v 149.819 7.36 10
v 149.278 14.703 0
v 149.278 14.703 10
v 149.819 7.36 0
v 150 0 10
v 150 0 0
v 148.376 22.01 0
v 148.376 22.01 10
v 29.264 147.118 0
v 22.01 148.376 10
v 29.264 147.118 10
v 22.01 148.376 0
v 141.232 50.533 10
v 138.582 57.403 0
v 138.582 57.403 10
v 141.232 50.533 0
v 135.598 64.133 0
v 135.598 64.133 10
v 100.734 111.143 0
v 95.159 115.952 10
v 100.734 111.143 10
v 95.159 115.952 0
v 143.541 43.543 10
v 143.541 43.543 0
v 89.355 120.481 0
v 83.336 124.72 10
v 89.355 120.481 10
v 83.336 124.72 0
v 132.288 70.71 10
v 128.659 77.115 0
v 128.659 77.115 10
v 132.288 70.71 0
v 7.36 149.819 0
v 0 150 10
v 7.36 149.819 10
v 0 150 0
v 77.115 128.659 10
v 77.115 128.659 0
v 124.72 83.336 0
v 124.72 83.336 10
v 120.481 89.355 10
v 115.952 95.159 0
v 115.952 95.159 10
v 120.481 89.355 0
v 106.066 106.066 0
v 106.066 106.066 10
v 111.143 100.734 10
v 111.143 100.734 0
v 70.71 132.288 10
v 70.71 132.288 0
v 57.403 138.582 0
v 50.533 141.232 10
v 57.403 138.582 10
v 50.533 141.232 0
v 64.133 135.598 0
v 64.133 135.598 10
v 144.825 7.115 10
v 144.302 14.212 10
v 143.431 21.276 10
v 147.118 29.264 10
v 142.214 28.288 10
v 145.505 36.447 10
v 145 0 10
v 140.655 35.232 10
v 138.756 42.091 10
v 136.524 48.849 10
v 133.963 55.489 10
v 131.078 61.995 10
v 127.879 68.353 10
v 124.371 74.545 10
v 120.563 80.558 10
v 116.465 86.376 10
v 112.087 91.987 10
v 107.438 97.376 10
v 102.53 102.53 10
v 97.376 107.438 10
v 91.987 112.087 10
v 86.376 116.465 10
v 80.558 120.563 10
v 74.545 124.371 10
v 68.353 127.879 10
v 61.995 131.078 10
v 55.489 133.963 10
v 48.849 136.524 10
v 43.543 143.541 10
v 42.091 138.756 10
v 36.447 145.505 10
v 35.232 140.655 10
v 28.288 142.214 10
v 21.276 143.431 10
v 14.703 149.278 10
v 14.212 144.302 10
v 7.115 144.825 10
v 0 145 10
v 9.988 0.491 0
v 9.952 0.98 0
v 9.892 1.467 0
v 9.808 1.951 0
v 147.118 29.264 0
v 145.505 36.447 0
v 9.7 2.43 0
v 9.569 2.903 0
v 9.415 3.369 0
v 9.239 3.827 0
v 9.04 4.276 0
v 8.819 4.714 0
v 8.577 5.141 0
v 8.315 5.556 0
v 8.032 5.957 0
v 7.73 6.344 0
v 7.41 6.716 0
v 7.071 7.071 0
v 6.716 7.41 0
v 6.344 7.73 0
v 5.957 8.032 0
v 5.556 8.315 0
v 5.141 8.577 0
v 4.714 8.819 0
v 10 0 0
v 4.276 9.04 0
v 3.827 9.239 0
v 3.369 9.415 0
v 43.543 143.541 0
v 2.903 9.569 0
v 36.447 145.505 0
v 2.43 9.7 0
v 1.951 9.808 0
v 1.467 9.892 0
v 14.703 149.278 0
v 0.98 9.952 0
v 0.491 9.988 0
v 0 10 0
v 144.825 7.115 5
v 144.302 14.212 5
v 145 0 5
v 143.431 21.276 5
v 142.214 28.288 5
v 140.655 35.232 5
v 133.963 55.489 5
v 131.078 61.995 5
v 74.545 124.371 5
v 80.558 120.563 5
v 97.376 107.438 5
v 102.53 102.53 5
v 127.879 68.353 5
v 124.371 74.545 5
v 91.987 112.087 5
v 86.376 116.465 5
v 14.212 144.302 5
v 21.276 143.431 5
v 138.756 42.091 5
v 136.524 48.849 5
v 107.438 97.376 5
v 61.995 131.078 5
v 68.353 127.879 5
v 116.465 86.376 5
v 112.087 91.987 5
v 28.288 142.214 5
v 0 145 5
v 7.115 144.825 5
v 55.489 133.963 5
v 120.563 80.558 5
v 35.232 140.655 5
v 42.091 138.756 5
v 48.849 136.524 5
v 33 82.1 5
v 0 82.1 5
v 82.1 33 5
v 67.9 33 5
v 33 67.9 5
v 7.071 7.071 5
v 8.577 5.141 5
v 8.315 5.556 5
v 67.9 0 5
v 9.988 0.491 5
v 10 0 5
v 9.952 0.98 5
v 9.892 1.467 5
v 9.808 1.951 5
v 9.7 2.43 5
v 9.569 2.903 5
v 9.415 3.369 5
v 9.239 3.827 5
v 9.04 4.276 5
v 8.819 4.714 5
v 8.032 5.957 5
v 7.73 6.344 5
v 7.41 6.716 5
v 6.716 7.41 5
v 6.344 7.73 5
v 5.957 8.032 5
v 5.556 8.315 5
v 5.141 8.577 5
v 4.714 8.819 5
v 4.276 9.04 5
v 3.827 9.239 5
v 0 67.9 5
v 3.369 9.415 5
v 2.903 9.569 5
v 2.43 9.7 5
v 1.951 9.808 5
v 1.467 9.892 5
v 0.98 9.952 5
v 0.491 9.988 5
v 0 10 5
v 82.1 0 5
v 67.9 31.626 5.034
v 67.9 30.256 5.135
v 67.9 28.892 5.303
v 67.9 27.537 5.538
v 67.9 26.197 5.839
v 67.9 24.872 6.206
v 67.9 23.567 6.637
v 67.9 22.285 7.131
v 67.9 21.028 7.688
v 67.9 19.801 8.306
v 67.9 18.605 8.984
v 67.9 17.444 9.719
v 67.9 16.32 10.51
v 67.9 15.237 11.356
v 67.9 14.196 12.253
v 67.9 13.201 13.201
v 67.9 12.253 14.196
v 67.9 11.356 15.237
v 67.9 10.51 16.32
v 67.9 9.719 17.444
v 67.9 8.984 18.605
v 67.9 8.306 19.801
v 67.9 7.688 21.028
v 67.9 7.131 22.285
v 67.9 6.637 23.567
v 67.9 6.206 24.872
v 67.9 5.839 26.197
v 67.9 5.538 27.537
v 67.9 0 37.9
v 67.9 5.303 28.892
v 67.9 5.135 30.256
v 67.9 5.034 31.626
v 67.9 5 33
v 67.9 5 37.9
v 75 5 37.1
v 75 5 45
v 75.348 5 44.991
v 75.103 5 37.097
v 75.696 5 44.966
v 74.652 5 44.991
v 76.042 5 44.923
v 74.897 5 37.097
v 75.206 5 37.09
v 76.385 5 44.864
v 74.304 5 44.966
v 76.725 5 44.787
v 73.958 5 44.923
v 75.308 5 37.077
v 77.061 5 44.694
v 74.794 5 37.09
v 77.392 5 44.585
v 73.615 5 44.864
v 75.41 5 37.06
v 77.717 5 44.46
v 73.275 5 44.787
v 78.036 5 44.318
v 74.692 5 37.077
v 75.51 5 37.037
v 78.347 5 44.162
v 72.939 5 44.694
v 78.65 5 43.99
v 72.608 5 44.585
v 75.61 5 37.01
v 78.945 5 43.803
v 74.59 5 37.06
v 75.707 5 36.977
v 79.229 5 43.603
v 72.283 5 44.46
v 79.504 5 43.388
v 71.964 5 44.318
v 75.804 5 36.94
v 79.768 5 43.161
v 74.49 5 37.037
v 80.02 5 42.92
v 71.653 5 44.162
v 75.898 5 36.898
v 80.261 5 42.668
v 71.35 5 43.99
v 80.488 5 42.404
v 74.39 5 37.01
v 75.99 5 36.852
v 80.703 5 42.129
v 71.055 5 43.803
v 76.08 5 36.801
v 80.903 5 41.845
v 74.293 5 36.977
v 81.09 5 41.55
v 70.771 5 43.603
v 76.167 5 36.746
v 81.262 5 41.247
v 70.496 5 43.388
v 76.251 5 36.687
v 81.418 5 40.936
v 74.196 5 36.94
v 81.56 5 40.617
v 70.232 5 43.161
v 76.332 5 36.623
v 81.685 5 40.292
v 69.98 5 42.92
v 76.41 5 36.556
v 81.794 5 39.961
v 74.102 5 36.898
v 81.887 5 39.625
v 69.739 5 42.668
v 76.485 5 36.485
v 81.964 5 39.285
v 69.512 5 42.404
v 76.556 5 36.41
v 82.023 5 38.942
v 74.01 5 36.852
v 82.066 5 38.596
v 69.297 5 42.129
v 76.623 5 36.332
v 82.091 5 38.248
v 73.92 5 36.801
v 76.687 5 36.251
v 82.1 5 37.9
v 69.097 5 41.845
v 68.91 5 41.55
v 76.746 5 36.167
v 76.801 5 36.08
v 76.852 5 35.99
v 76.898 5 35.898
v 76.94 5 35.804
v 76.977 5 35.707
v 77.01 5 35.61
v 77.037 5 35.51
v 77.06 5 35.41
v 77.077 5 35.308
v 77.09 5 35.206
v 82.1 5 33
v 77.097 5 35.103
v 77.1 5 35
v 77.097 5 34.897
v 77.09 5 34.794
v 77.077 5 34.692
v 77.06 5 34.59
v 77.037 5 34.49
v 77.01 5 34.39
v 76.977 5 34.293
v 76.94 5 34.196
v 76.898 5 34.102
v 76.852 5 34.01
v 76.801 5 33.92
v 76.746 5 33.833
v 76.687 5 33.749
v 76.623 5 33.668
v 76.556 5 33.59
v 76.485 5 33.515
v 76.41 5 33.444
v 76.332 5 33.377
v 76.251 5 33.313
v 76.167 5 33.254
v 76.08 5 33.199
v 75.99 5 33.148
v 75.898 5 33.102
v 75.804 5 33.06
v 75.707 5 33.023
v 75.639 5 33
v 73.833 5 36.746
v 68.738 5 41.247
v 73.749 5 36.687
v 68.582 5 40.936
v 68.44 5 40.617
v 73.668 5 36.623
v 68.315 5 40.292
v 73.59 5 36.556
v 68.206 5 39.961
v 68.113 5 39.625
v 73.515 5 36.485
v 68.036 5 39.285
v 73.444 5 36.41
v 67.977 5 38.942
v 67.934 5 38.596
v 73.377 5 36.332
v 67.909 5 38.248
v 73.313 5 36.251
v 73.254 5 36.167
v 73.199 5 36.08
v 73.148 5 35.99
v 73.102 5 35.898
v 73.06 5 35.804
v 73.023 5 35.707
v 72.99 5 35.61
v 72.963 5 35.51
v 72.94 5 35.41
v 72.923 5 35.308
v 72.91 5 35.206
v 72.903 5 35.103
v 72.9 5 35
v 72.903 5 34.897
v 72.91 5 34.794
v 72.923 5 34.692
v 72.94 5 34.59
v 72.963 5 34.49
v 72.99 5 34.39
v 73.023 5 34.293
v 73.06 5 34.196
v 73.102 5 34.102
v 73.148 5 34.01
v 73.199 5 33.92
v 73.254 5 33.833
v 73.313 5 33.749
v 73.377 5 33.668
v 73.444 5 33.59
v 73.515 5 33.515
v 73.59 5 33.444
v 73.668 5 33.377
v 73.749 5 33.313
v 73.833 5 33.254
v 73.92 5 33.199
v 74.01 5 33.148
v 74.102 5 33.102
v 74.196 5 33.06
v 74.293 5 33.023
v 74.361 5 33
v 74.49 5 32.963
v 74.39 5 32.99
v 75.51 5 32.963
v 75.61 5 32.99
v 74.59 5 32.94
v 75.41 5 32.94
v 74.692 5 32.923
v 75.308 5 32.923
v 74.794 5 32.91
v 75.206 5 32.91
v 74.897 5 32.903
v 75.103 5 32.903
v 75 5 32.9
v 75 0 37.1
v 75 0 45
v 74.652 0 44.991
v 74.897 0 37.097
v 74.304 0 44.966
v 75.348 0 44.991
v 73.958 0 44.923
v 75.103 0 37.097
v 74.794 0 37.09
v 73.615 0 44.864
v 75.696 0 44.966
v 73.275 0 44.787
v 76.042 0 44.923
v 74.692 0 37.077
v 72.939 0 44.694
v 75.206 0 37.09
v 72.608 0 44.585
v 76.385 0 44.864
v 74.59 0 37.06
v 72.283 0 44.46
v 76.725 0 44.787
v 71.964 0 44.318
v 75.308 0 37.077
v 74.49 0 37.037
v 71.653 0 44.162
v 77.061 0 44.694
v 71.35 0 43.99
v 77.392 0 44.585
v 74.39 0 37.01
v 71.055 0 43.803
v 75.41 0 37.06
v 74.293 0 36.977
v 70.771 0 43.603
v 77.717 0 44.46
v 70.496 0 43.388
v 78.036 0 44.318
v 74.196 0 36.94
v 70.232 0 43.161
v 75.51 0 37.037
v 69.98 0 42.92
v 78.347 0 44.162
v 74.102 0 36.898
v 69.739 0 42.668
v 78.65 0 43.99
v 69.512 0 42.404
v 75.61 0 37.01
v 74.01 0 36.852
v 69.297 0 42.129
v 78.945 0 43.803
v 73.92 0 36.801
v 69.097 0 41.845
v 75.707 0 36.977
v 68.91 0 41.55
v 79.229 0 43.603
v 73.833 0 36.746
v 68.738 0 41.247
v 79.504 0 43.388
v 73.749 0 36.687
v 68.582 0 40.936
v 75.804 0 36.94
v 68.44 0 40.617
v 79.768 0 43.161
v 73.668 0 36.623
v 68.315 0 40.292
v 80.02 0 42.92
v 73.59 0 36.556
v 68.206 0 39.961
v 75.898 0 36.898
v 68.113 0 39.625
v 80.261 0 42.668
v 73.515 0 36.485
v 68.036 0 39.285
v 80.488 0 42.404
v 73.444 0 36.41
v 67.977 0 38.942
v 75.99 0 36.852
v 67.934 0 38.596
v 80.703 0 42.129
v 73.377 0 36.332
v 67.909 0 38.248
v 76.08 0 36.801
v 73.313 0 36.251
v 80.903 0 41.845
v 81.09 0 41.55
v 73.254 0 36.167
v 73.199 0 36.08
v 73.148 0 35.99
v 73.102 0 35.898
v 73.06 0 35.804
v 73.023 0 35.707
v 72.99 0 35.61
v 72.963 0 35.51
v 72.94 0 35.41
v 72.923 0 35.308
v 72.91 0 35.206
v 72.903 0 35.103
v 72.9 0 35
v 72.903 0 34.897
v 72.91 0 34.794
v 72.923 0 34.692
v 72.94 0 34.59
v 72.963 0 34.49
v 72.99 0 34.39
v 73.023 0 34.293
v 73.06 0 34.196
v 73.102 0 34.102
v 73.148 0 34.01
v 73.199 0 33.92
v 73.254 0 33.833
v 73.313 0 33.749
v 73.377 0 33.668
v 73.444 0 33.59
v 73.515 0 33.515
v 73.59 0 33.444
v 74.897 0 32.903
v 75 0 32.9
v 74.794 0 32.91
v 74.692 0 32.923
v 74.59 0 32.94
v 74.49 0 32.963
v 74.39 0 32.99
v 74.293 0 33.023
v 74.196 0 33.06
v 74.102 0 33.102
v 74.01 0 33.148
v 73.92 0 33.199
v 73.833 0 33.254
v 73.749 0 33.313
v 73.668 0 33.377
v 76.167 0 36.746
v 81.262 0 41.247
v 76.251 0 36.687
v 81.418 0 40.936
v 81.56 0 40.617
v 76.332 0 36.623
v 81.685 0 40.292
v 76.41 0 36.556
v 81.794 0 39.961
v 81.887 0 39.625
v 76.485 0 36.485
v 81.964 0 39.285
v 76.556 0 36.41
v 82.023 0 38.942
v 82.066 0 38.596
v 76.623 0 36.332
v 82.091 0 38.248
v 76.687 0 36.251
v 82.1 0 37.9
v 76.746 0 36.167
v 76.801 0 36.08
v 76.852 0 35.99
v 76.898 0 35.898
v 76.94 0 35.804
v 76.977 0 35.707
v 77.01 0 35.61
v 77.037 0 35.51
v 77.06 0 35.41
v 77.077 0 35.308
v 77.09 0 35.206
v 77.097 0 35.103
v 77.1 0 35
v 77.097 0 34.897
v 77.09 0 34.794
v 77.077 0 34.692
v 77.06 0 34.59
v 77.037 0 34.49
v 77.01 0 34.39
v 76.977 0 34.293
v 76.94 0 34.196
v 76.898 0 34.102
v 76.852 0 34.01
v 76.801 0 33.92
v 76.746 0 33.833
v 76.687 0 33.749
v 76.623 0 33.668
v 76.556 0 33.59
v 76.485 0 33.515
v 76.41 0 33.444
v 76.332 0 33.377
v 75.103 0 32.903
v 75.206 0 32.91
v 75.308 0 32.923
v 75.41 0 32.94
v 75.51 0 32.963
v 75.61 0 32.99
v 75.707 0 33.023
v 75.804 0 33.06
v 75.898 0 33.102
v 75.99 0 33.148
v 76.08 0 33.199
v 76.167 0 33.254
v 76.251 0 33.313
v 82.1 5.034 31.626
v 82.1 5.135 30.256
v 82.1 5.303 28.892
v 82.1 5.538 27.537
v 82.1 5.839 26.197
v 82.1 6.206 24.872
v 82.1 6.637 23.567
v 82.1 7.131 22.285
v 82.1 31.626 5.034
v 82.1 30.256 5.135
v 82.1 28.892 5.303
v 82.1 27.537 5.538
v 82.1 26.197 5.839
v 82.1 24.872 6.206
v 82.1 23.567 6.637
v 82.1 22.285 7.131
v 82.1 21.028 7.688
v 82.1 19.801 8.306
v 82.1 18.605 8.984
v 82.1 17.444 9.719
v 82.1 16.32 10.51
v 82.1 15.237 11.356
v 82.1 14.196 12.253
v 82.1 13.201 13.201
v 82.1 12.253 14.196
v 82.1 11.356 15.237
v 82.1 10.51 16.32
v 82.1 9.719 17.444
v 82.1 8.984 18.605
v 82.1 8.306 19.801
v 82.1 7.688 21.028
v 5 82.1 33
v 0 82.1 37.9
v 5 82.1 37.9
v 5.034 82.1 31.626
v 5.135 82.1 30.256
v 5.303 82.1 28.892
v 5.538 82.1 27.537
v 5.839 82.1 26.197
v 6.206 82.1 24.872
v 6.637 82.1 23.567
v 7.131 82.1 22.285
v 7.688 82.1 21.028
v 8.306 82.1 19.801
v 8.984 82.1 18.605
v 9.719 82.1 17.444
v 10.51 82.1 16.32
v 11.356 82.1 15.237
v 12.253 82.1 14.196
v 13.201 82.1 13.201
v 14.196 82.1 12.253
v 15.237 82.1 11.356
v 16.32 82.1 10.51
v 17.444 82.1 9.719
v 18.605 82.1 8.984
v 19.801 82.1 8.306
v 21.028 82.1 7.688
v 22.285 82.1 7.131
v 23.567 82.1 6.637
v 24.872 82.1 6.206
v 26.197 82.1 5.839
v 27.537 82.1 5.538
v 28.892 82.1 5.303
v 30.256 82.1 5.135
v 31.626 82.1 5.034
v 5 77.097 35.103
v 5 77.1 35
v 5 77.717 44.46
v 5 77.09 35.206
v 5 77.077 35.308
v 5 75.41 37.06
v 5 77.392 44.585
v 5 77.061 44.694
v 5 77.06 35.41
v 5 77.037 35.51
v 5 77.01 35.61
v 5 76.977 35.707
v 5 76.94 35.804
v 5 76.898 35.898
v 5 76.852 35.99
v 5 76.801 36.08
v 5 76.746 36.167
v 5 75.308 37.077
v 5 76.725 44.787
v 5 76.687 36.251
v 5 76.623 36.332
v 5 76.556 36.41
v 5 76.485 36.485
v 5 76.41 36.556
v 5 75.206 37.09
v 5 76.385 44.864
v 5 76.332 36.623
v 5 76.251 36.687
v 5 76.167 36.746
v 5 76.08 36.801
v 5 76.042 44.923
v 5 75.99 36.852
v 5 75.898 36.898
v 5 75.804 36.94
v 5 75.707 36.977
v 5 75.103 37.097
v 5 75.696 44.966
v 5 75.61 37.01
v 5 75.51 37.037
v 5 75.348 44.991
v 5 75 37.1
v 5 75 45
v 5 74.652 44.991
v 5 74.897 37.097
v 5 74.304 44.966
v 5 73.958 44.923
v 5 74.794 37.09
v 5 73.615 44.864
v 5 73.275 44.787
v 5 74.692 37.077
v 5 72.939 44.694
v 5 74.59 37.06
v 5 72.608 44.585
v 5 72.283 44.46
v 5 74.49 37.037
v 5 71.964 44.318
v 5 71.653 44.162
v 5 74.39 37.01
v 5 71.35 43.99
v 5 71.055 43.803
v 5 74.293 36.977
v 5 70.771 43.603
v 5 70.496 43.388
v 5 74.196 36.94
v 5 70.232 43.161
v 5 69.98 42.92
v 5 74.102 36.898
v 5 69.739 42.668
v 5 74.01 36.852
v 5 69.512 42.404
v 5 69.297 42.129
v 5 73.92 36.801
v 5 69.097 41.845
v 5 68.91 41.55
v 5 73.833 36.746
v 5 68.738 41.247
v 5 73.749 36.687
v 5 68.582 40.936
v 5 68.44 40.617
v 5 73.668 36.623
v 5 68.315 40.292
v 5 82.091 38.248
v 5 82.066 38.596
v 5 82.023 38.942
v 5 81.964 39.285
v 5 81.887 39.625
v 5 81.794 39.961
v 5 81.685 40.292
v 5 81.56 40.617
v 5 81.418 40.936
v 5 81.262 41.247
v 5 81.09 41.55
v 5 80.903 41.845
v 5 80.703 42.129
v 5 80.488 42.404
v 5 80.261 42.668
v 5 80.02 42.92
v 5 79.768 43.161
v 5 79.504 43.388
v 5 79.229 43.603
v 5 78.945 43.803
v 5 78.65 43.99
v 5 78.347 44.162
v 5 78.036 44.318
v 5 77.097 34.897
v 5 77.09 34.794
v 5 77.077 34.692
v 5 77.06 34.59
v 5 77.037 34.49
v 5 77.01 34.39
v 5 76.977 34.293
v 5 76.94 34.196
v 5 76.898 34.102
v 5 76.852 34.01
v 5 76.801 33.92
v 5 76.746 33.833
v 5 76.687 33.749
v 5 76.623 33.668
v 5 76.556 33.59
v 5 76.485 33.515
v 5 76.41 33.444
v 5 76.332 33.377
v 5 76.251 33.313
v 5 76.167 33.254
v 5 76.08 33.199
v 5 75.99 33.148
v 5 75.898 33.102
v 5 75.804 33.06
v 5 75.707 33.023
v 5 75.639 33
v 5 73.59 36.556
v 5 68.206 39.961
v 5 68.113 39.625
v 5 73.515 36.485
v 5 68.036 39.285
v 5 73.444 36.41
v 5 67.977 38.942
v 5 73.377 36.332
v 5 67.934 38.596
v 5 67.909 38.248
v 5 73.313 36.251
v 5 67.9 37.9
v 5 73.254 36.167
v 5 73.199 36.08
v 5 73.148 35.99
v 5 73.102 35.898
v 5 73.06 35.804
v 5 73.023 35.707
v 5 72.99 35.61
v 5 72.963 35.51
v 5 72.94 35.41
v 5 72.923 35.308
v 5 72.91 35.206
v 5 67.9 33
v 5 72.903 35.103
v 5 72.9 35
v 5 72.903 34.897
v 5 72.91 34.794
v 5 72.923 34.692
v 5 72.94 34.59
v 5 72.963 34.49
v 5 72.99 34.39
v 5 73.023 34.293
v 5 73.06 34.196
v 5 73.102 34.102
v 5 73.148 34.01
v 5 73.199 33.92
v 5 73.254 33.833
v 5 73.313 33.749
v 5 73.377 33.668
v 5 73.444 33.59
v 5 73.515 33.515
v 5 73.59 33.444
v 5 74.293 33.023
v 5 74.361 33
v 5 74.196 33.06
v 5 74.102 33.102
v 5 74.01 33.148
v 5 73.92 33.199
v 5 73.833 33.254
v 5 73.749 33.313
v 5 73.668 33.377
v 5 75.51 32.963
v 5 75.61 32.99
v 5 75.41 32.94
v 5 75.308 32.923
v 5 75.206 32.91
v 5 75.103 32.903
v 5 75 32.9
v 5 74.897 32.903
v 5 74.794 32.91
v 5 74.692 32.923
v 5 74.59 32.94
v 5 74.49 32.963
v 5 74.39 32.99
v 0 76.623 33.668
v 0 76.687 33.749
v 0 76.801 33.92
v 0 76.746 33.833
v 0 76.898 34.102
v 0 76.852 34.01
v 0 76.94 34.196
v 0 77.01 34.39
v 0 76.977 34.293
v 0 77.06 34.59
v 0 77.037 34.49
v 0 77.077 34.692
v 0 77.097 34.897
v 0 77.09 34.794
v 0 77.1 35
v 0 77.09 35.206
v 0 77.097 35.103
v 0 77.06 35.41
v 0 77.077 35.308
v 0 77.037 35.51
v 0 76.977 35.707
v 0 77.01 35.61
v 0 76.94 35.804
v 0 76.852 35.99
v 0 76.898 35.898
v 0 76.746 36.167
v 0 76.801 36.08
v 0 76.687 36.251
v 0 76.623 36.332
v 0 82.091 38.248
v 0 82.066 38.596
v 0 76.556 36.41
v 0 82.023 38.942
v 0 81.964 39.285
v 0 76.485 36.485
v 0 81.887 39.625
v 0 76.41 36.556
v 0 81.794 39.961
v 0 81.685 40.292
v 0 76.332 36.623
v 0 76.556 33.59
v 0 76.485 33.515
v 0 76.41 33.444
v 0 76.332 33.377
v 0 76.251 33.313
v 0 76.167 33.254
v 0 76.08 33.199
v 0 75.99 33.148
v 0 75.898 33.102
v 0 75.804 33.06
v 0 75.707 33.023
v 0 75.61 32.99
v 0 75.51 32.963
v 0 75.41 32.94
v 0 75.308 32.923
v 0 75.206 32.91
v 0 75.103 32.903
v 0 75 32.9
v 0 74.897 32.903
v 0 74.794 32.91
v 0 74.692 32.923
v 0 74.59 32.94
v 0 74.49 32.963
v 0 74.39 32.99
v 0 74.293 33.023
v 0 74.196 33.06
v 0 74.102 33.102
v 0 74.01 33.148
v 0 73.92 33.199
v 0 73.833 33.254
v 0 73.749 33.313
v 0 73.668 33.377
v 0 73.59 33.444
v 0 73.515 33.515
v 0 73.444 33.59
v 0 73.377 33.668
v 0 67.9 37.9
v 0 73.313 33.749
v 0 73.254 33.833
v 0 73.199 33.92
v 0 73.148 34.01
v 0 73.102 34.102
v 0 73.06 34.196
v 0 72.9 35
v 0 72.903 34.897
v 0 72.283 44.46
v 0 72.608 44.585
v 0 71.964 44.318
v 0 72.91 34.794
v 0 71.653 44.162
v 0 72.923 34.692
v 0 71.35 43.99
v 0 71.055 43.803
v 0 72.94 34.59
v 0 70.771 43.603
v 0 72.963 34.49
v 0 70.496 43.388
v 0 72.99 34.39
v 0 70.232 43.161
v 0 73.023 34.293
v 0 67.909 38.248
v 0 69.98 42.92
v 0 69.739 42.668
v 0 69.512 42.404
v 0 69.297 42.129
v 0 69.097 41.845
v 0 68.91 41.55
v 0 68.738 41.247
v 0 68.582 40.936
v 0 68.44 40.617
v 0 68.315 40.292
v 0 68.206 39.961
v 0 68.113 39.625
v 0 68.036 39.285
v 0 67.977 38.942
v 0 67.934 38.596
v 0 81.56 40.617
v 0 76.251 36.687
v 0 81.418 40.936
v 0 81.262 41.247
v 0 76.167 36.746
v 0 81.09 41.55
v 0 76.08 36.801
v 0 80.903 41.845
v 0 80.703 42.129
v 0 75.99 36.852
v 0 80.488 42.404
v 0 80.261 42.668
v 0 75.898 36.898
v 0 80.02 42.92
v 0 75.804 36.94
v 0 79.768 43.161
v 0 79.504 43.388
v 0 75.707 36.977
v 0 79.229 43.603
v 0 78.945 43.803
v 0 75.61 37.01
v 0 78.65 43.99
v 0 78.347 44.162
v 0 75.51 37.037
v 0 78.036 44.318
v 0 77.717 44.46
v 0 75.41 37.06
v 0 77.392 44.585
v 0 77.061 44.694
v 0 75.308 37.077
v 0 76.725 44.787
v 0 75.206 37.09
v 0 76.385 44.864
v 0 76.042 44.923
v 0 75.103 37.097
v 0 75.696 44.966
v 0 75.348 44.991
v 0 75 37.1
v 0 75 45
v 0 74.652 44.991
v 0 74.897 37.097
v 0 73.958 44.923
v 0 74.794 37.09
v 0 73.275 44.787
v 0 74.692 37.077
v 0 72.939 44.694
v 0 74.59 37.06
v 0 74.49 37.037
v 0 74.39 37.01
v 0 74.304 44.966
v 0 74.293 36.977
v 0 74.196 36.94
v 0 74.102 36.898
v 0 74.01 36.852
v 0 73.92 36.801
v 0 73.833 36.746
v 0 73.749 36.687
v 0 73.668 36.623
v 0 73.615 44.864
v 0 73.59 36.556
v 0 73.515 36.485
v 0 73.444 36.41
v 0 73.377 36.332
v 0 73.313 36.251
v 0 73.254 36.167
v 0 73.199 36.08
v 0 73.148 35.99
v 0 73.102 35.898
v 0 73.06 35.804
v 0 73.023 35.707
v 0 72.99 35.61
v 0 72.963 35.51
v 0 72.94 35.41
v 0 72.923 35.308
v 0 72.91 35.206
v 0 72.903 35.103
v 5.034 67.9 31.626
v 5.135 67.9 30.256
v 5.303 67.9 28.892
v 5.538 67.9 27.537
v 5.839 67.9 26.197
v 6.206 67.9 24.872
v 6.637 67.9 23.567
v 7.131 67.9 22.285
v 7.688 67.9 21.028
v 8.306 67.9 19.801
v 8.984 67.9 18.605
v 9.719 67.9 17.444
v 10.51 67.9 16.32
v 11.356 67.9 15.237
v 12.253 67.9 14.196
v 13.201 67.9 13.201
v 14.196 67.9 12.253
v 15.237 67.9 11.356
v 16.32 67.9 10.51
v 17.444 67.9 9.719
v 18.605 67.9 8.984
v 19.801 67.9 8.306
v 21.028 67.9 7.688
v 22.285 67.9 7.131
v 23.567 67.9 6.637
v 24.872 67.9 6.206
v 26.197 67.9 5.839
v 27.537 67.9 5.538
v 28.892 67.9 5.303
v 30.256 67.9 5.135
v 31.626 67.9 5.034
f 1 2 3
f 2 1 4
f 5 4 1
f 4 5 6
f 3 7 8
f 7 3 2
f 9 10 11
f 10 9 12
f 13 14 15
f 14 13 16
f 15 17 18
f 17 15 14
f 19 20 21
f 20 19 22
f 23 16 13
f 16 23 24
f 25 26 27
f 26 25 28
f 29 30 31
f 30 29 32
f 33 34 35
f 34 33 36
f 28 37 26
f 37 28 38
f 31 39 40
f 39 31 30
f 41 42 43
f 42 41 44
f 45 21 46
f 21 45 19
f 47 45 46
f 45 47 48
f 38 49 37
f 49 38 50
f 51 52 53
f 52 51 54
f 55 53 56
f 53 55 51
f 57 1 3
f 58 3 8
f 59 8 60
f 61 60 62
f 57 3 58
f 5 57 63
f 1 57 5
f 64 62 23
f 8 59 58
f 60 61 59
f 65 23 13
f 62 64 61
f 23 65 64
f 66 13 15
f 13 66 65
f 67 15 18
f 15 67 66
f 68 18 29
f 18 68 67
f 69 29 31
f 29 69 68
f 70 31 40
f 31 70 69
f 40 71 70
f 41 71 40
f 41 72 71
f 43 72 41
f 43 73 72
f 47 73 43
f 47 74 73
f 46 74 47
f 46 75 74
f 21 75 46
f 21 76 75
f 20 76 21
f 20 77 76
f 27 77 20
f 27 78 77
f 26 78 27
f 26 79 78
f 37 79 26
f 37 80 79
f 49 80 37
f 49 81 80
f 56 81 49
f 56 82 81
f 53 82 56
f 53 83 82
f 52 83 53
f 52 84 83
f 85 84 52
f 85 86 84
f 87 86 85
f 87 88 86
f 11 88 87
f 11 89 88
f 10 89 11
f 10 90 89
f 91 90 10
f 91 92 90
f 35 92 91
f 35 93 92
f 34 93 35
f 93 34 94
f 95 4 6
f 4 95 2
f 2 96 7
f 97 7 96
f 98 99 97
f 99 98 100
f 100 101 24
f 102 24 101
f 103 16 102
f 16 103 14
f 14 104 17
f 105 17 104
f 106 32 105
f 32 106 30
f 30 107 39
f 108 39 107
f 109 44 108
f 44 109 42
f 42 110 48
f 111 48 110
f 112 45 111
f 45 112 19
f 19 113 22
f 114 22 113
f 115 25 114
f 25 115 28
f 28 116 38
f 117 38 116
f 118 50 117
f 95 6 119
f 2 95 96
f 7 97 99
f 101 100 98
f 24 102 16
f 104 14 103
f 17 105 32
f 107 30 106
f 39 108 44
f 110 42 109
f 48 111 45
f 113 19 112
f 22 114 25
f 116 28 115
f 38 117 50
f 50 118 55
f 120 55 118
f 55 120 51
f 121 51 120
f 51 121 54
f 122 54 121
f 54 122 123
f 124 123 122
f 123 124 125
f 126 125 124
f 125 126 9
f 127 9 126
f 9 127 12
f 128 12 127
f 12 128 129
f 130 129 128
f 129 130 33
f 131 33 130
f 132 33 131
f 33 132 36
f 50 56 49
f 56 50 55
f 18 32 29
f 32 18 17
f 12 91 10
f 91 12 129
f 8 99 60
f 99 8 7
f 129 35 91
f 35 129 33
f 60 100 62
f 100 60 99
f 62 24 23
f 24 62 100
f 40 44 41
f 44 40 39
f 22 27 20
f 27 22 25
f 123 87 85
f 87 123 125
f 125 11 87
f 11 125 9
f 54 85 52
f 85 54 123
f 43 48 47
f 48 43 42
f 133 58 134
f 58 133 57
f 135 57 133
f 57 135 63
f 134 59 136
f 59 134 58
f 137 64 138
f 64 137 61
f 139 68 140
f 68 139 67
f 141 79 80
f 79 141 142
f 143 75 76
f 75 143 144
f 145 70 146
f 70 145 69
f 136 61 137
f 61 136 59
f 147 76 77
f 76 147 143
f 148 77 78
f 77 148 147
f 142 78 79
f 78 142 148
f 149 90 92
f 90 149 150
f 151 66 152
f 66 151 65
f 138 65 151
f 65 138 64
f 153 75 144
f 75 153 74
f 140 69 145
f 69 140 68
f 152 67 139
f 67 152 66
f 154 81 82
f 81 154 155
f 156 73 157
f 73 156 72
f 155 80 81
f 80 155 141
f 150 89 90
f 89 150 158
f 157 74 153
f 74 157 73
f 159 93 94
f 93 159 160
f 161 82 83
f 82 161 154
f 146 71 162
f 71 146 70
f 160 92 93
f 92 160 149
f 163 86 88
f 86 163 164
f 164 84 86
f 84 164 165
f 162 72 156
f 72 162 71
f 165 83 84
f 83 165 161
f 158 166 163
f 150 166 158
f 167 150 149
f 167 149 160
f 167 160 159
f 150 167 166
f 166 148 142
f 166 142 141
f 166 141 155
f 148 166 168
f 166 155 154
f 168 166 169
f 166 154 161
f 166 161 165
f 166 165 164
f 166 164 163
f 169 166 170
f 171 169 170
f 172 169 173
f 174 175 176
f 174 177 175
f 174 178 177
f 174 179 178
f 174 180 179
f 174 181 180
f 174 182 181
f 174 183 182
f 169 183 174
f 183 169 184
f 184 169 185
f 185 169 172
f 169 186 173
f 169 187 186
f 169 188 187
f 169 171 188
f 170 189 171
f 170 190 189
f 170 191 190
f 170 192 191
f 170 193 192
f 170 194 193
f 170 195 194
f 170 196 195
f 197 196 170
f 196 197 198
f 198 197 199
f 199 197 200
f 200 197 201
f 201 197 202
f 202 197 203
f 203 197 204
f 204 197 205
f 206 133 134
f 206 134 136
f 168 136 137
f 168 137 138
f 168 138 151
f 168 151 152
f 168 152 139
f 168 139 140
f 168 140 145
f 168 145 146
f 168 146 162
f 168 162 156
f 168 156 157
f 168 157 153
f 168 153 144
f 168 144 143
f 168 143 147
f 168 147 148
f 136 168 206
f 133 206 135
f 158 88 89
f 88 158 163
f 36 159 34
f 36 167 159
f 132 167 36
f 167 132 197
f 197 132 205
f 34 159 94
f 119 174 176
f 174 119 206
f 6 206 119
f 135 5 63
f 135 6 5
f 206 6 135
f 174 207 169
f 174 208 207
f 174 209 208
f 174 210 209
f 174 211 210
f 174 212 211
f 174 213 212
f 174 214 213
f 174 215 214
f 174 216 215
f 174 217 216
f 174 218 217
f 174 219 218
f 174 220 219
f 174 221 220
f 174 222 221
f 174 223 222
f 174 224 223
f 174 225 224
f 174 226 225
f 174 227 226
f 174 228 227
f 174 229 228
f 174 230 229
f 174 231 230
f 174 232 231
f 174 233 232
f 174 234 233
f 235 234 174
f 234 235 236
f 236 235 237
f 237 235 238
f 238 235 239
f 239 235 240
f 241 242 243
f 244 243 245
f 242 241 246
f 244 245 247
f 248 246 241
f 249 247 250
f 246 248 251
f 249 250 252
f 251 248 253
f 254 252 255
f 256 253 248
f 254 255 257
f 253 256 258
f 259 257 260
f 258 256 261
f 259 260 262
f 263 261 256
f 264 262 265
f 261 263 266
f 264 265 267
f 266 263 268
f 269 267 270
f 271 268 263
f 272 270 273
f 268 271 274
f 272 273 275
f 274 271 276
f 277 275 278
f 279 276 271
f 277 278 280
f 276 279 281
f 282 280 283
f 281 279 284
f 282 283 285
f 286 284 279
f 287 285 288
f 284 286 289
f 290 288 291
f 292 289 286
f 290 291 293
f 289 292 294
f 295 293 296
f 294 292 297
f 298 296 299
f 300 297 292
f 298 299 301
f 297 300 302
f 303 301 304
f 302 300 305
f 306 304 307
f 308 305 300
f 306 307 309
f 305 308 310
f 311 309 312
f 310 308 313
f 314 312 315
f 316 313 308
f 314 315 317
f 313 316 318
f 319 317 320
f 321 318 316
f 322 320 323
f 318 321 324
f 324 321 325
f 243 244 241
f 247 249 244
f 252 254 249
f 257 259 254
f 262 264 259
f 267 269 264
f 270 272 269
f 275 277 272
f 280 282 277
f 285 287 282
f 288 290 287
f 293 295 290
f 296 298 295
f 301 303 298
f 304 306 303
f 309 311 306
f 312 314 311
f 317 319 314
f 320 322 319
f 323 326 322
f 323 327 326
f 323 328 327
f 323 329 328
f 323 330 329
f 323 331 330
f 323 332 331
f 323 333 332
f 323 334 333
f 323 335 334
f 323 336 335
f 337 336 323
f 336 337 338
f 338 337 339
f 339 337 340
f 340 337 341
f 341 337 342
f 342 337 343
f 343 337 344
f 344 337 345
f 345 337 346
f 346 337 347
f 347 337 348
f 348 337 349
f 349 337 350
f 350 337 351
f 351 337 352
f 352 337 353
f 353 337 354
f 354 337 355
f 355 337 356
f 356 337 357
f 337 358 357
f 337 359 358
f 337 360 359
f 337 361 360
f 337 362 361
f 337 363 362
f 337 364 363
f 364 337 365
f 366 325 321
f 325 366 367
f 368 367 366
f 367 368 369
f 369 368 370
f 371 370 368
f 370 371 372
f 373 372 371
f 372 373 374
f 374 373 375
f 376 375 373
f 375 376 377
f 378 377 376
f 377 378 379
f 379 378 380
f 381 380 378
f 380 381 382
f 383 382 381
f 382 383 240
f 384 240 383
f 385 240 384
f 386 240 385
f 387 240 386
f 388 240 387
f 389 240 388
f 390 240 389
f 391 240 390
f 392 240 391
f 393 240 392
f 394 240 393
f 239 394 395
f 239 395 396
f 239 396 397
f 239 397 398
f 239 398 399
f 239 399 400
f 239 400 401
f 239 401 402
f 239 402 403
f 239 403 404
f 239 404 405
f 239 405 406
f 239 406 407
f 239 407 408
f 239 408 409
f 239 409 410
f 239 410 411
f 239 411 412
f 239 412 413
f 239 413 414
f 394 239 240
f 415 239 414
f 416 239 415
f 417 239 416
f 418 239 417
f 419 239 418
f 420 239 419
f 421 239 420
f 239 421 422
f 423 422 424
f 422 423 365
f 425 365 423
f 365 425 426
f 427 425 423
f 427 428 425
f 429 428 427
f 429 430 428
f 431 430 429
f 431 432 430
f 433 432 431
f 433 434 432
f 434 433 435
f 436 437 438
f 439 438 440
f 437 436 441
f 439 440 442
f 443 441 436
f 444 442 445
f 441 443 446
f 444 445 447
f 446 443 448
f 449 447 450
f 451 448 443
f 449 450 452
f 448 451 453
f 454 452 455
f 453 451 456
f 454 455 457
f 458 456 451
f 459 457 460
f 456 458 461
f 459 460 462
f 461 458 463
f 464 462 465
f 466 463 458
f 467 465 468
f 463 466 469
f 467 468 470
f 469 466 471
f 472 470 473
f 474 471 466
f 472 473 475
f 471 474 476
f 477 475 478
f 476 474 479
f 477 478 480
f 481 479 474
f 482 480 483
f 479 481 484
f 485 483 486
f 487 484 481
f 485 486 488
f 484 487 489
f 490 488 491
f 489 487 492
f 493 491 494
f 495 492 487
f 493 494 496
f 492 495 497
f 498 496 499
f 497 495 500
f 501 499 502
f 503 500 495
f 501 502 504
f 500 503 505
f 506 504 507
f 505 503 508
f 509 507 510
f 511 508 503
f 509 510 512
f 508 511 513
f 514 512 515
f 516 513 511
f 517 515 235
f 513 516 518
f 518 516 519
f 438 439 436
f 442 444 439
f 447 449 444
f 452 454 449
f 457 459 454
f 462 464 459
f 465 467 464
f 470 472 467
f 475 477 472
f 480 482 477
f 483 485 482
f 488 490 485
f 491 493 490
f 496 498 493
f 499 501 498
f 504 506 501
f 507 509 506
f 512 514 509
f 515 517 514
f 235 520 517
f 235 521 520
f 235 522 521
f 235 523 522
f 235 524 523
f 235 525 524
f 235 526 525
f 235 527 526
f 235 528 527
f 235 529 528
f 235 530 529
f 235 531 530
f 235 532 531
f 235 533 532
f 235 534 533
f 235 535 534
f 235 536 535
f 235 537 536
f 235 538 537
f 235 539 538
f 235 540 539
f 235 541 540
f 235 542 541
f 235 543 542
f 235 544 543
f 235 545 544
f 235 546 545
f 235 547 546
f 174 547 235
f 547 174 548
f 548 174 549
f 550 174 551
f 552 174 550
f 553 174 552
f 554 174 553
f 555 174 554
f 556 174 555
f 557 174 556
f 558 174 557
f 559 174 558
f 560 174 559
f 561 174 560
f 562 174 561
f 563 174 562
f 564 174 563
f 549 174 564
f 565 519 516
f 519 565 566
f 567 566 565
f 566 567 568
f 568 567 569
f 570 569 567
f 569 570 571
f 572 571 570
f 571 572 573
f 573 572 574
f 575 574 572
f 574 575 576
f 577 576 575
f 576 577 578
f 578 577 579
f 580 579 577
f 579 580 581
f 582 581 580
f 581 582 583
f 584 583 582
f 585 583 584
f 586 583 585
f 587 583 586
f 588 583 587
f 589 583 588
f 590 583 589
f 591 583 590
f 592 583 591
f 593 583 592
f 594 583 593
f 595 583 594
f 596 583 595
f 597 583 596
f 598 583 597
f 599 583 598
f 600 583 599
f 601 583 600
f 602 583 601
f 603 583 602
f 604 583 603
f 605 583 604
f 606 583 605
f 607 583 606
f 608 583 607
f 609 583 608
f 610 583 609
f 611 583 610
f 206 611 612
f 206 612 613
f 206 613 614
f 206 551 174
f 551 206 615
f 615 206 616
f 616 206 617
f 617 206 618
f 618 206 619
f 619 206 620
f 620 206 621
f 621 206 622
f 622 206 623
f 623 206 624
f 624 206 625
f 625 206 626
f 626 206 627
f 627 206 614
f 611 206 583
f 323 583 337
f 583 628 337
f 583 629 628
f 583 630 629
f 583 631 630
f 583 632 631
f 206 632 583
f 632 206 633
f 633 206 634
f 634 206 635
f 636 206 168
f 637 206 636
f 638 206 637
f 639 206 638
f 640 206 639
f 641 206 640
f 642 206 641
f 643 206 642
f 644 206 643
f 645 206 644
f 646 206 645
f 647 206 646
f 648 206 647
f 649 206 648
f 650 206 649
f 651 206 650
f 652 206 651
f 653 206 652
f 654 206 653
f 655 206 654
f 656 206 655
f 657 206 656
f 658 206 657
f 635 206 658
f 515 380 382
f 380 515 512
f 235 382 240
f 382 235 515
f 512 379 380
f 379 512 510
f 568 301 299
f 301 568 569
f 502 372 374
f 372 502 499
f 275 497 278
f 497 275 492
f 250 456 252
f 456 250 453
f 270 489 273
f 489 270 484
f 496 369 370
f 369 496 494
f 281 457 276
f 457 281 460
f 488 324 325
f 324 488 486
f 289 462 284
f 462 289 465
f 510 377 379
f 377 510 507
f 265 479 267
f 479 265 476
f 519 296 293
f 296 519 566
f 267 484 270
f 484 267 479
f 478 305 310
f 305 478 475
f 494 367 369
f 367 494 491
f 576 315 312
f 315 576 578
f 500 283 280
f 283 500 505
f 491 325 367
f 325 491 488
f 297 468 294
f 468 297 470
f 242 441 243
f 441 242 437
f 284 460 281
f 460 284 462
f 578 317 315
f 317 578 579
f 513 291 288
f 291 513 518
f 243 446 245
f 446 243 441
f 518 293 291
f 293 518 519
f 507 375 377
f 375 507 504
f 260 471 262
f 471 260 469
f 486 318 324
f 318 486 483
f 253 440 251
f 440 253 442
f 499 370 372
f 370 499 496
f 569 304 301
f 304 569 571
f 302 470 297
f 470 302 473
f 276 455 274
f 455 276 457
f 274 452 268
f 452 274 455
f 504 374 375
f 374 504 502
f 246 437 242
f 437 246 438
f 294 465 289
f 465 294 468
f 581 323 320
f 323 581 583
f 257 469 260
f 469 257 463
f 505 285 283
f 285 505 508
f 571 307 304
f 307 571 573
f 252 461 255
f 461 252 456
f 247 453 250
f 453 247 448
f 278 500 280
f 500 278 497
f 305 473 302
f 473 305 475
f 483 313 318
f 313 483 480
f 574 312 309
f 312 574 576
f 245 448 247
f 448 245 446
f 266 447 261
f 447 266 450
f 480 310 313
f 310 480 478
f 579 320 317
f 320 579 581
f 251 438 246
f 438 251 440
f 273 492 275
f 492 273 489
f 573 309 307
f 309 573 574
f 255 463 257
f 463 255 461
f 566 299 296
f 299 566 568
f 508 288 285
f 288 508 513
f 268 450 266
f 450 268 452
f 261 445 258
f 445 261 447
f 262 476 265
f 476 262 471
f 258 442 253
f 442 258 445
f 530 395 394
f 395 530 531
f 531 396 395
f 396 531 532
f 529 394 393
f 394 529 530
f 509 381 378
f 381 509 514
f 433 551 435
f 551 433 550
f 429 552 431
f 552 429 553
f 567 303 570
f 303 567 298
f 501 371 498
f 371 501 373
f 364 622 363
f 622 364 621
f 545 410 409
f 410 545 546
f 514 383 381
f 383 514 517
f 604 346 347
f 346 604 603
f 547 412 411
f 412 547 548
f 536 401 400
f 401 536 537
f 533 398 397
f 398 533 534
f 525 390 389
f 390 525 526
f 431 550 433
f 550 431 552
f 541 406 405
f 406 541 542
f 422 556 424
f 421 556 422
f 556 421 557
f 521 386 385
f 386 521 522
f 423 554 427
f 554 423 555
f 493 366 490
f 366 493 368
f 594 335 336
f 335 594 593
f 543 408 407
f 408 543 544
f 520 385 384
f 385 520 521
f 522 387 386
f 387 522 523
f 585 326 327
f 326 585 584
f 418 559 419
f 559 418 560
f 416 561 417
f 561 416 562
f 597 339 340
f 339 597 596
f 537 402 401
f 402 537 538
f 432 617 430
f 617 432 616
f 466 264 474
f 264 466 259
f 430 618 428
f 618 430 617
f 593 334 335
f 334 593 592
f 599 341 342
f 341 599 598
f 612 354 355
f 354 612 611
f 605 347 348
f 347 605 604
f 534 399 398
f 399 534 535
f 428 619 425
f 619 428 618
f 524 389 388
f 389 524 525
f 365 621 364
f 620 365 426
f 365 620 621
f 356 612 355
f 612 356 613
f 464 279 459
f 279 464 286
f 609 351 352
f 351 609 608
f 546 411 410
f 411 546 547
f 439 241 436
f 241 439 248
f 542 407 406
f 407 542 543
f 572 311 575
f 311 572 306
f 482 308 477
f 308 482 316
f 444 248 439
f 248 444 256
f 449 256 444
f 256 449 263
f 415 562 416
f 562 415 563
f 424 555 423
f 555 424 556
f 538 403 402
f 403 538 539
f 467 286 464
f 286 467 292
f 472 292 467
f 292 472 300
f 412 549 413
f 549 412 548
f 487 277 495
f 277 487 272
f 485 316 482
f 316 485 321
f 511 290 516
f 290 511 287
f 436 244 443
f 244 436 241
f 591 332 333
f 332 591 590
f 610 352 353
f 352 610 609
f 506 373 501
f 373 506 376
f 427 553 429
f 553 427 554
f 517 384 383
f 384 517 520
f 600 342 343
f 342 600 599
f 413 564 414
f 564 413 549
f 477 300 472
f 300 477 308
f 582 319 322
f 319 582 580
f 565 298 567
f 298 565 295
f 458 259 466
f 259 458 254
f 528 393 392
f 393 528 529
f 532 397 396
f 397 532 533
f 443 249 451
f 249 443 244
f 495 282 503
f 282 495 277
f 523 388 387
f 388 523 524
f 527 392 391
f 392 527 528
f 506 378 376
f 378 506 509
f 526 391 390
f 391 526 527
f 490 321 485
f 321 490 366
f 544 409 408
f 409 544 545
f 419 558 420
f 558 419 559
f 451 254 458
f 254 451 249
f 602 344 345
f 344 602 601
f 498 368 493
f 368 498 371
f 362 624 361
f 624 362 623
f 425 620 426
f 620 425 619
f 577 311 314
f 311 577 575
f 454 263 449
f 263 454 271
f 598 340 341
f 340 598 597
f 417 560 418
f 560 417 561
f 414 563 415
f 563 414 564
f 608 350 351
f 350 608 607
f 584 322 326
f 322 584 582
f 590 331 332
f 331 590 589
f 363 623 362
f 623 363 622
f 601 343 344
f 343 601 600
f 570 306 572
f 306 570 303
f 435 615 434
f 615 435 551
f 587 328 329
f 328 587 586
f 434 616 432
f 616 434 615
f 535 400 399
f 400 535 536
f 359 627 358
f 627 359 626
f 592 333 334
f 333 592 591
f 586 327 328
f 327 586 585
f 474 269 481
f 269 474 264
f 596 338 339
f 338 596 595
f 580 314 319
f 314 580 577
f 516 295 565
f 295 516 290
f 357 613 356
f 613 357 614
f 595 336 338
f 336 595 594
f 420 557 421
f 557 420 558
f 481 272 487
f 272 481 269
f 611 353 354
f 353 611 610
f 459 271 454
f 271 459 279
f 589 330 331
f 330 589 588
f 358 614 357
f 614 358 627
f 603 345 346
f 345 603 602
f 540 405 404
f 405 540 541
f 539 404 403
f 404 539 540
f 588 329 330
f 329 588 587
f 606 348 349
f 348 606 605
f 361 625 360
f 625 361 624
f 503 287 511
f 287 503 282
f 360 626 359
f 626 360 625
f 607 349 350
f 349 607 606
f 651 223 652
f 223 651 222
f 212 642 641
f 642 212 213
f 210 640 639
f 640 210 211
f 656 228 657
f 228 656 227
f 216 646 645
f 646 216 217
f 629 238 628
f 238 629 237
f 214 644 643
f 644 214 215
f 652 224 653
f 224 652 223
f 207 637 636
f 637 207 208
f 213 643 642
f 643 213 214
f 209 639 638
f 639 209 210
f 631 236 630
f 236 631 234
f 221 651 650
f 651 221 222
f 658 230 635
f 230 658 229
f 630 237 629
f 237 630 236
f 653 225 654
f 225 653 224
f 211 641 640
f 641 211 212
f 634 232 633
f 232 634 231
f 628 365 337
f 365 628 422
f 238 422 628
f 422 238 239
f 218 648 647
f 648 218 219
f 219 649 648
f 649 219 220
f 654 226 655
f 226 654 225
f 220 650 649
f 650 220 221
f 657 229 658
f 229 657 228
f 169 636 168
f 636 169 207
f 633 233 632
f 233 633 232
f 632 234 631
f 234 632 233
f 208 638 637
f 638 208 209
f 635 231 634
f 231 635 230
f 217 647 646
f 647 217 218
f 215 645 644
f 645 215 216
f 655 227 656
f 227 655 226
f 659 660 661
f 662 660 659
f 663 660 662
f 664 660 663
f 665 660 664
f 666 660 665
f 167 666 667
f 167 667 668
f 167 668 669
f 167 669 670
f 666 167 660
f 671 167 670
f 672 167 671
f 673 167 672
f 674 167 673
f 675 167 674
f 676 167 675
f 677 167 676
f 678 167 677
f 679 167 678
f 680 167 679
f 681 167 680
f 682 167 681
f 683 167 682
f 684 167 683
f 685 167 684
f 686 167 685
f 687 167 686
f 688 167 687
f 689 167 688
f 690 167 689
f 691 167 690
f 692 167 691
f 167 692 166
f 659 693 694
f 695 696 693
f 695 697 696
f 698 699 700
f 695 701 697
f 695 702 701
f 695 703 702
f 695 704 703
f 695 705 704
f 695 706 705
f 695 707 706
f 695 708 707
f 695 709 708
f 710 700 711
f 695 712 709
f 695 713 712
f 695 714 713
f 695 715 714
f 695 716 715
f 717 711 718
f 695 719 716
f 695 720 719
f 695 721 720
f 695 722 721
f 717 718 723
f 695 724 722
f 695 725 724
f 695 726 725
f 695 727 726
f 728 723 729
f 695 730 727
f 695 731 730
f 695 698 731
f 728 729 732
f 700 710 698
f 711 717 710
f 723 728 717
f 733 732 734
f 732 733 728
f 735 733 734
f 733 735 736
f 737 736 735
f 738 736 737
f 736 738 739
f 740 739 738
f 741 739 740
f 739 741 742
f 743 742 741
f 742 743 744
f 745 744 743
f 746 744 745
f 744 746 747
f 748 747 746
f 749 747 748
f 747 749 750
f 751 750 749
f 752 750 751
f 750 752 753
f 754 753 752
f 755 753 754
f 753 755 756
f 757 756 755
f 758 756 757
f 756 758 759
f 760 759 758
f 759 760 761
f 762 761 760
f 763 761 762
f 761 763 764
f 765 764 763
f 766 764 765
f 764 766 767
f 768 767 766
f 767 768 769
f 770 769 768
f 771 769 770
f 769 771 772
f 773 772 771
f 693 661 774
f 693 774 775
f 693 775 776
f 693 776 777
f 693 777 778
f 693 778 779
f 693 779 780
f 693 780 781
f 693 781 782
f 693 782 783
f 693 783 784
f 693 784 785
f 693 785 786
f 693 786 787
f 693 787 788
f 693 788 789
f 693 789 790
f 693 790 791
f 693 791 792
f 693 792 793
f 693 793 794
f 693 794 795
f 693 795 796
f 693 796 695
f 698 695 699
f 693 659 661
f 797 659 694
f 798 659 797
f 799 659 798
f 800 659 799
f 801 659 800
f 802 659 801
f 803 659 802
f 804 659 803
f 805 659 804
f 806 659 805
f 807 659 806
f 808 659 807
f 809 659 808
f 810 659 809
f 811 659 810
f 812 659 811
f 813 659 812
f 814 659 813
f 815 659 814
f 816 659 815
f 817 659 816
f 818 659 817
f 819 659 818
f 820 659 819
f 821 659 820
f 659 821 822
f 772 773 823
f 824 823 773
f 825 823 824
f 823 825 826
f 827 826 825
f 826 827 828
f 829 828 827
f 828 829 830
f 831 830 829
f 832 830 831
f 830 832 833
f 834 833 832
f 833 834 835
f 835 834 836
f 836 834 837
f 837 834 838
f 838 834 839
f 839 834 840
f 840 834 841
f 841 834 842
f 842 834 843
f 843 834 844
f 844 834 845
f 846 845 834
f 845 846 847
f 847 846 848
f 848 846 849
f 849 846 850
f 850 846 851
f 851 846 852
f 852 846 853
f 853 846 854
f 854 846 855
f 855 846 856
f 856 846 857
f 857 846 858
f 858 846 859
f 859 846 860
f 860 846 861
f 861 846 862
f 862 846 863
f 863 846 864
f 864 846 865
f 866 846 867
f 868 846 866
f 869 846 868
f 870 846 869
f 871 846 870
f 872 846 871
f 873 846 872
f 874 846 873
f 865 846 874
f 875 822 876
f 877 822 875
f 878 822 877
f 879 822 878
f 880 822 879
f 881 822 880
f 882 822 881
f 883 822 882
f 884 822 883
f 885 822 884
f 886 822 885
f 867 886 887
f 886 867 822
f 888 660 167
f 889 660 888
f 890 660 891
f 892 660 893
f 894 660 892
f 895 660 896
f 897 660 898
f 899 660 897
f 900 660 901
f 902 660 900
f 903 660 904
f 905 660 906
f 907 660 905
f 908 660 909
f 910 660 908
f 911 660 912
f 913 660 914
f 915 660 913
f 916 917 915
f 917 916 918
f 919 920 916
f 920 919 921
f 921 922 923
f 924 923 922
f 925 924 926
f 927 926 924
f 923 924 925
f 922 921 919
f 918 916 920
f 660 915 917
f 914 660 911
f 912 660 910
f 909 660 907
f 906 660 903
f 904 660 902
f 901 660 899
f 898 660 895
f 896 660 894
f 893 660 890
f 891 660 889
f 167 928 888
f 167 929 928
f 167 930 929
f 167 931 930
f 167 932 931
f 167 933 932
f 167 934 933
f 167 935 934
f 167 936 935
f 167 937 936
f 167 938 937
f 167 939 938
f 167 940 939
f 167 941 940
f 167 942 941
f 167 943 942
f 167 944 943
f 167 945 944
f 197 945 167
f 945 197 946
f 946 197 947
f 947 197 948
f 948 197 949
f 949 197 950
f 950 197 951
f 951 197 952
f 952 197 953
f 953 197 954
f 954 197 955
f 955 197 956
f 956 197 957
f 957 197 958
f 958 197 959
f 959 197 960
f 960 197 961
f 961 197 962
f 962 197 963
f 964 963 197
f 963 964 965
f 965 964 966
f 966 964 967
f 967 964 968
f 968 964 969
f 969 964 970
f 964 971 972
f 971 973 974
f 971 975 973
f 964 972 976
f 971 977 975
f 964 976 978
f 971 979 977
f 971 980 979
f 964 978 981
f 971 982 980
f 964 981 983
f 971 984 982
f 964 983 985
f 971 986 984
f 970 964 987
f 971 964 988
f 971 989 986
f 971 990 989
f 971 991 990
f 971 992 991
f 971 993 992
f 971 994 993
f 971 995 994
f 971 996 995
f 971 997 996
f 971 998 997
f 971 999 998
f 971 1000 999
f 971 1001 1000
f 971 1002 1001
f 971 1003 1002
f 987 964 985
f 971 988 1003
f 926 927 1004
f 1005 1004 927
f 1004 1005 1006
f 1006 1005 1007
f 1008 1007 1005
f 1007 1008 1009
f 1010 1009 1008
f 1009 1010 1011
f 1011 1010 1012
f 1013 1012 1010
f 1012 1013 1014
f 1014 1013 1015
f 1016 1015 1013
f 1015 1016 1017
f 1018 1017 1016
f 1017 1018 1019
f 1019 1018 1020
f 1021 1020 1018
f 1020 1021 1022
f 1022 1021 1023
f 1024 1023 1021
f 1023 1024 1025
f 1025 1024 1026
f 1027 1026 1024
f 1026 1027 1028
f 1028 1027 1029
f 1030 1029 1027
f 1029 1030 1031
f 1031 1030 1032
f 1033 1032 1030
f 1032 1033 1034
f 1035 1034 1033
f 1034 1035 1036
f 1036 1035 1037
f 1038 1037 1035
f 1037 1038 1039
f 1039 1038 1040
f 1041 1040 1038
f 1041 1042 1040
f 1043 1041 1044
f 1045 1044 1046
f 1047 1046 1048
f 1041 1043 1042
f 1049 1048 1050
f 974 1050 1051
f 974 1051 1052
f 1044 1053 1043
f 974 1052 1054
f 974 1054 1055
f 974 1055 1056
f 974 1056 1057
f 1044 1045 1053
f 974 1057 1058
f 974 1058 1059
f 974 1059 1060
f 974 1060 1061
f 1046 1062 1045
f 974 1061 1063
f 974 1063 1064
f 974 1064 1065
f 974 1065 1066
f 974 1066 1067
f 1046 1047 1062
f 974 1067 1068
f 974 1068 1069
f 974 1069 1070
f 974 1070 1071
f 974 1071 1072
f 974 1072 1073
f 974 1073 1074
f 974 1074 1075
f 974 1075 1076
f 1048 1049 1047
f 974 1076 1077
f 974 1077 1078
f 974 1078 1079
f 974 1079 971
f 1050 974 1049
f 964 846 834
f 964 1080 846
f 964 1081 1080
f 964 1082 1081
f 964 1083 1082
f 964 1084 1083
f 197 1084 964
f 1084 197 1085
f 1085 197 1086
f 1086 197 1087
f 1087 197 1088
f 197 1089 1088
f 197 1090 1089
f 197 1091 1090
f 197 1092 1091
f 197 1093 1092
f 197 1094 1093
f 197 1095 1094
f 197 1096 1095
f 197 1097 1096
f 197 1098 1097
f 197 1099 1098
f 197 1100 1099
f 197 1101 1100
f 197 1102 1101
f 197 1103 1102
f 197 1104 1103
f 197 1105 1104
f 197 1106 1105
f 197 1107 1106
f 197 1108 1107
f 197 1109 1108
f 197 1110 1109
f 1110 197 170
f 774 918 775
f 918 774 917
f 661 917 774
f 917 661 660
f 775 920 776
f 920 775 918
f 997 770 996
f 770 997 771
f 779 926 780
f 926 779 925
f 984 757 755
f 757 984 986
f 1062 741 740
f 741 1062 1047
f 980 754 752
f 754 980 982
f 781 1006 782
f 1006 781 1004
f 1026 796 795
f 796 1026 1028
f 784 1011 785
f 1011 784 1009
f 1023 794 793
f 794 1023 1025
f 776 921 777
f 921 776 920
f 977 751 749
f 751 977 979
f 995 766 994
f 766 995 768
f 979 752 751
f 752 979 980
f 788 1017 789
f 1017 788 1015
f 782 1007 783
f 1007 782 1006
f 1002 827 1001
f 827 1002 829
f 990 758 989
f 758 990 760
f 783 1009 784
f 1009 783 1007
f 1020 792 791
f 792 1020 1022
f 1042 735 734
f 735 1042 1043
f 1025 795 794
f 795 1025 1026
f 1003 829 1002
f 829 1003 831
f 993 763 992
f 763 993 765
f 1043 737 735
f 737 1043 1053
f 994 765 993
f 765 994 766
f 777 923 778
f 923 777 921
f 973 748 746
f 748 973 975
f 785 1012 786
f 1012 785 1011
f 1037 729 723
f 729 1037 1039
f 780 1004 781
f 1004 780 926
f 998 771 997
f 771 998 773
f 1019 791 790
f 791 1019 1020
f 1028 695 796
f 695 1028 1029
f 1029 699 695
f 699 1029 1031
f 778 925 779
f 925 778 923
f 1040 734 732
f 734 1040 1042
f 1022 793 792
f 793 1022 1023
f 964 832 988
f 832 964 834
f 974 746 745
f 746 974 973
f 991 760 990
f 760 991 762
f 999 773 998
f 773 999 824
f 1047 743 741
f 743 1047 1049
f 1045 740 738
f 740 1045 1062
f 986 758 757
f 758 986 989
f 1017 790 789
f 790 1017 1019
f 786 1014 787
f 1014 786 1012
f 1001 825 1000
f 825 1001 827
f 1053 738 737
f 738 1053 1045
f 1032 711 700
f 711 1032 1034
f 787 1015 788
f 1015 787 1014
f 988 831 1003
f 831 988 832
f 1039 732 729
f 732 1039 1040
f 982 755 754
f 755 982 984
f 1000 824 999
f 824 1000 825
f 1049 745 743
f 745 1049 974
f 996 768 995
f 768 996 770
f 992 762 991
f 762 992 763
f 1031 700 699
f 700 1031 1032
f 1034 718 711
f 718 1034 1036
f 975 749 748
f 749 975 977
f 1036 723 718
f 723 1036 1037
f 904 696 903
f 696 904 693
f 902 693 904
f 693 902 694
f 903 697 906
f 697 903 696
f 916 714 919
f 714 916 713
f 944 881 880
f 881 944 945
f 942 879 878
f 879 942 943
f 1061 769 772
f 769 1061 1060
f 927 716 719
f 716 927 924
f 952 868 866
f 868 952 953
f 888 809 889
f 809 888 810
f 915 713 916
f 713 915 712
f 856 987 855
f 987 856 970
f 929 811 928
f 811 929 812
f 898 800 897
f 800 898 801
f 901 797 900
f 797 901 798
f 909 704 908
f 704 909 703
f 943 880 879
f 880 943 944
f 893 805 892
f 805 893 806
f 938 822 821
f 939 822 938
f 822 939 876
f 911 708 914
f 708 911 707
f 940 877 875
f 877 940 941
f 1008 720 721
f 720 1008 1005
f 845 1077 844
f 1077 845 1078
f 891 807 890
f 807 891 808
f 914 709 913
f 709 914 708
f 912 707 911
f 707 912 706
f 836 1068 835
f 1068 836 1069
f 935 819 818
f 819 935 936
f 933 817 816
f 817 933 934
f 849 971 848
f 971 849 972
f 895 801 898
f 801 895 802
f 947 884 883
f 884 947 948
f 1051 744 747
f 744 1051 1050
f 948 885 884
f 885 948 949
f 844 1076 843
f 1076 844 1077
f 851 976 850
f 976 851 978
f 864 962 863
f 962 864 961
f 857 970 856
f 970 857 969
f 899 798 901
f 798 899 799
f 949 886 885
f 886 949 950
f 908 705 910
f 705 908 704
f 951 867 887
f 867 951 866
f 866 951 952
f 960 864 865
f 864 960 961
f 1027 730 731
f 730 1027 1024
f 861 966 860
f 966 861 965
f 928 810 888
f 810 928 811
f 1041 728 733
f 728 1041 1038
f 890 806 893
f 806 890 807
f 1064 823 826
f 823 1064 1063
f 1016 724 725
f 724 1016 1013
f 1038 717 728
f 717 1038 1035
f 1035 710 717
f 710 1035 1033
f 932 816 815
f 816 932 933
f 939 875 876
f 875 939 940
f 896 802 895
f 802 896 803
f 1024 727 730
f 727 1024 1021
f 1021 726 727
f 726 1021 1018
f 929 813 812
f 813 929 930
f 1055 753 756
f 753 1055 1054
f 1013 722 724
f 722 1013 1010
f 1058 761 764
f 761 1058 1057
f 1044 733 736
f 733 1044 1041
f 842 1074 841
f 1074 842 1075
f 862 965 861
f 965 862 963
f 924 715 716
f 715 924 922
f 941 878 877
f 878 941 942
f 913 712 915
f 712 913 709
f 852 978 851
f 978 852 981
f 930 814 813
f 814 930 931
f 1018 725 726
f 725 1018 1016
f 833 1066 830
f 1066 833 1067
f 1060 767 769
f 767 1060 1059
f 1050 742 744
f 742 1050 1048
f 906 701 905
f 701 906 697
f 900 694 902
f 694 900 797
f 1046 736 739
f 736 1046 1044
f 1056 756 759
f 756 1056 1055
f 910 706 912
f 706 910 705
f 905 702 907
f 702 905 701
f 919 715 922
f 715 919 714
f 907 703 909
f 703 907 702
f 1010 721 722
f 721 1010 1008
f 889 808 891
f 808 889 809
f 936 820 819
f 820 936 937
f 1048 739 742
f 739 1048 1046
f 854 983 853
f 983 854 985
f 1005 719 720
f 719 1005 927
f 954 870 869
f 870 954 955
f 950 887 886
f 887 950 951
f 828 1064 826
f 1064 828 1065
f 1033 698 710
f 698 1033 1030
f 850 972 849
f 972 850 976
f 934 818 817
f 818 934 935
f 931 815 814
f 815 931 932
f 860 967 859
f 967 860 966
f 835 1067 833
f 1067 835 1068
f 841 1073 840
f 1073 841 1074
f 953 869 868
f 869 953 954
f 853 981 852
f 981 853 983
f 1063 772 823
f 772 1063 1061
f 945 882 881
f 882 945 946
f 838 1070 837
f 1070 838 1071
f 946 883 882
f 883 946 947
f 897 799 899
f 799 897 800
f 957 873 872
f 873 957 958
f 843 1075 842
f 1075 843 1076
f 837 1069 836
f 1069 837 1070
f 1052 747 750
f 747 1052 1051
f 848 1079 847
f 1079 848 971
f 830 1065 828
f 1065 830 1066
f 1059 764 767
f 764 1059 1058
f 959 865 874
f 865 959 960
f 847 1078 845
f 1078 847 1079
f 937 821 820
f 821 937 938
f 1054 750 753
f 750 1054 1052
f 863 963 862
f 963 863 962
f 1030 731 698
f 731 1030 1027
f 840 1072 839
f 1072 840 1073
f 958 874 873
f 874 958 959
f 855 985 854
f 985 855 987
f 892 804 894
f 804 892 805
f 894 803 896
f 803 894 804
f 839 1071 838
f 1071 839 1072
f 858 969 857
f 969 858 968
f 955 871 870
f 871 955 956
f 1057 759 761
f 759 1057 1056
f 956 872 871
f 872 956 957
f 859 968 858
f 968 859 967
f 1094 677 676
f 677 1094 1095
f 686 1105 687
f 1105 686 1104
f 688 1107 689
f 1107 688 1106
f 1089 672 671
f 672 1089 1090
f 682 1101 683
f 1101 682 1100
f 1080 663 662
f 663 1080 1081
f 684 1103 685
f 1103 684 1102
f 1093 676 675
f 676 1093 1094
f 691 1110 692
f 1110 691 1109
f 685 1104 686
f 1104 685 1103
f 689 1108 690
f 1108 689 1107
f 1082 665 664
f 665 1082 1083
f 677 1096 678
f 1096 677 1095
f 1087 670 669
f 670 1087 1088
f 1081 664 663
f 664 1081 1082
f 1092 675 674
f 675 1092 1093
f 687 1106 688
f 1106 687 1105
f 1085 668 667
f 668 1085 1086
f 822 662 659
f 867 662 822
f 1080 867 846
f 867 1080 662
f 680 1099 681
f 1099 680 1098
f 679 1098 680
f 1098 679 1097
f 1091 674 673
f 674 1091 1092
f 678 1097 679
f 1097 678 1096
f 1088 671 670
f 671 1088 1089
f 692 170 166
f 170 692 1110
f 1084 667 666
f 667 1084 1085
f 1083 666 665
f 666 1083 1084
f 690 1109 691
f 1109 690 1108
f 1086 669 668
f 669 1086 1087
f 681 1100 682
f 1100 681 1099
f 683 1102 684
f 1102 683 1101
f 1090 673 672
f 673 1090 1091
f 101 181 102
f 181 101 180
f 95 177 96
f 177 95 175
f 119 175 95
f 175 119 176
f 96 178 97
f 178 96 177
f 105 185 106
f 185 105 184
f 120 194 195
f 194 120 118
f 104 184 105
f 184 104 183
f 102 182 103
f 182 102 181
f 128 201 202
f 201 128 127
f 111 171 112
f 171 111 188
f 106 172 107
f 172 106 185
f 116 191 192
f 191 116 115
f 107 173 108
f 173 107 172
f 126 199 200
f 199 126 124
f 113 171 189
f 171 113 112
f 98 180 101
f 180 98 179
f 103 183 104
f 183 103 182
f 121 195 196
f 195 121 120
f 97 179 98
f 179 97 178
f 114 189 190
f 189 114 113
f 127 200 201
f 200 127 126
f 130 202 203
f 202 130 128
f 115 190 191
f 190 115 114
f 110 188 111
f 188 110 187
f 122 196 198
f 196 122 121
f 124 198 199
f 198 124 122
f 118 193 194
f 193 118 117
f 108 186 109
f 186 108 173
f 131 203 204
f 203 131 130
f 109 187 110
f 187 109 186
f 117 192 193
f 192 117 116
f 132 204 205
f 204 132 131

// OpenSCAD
$fn=128;
radius=150;      // radius of the shelf
thickness=5;    // thickness of the shelf
previs=thickness+5; // this is the front side of the shelf (let's make it a bit bigger) - default value should be OK
support_l=40;   // length of support for screw
screw_d=4.2;      // screw diameter
support_thickness=5;        // thickness of the "leg" (default value is usually OK)
support_width=screw_d+10; //  width of the "leg" (defined as screw hole + 10mm)
corner_hole=10;             // radius of corner hole (for cables etc.)


// main code

difference() {
    union() {
     shelf(radius,thickness,previs);
    
     translate([radius/2+support_width/2,0,thickness]) rotate([90,0,180]) 
      support(support_l,screw_d,support_width,support_thickness);
    
     translate([0,radius/2-support_width/2,thickness]) 
      rotate([90,0,90]) 
       support(support_l,screw_d,support_width,support_thickness);
    }
    cylinder(r=corner_hole,h=thickness+0.1); // corner hole
}
    

module shelf(radius,thickness,previs) {
 difference() {
  cylinder(r=radius,h=previs);
  translate([0,0,thickness]) cylinder(r=radius-thickness,h=thickness+100);
  translate([-radius-0.1,-radius-0.1,-0.1]) 
     cube([radius+0.1,radius*2+0.1,thickness+previs+0.2]);
  translate([-0.1,-radius,-0.1]) cube([radius+0.2,radius,thickness+previs+0.2]);
 }
    
}

module support(support_l,screw_d,support_width,support_thickness) {
    difference() {
     union() {
      cube([support_width,support_l-support_width/2,support_thickness]);
      translate([support_width/2,support_l-support_width/2,0]) cylinder(d=support_width,h=support_thickness);
     }
     translate([support_width/2,support_l*0.75,-0.1]) cylinder(d=screw_d,h=support_thickness+0.2);
    }
    
    difference() {
    translate([0,0,support_thickness]) 
    cube([support_width,support_l*0.70,support_l*0.70]);
      translate([-0.1,support_l*0.70,support_thickness+support_l*0.70])
        rotate([0,90,0])  
         cylinder(r=support_l*0.70,h=support_width+0.2);
    }
}
